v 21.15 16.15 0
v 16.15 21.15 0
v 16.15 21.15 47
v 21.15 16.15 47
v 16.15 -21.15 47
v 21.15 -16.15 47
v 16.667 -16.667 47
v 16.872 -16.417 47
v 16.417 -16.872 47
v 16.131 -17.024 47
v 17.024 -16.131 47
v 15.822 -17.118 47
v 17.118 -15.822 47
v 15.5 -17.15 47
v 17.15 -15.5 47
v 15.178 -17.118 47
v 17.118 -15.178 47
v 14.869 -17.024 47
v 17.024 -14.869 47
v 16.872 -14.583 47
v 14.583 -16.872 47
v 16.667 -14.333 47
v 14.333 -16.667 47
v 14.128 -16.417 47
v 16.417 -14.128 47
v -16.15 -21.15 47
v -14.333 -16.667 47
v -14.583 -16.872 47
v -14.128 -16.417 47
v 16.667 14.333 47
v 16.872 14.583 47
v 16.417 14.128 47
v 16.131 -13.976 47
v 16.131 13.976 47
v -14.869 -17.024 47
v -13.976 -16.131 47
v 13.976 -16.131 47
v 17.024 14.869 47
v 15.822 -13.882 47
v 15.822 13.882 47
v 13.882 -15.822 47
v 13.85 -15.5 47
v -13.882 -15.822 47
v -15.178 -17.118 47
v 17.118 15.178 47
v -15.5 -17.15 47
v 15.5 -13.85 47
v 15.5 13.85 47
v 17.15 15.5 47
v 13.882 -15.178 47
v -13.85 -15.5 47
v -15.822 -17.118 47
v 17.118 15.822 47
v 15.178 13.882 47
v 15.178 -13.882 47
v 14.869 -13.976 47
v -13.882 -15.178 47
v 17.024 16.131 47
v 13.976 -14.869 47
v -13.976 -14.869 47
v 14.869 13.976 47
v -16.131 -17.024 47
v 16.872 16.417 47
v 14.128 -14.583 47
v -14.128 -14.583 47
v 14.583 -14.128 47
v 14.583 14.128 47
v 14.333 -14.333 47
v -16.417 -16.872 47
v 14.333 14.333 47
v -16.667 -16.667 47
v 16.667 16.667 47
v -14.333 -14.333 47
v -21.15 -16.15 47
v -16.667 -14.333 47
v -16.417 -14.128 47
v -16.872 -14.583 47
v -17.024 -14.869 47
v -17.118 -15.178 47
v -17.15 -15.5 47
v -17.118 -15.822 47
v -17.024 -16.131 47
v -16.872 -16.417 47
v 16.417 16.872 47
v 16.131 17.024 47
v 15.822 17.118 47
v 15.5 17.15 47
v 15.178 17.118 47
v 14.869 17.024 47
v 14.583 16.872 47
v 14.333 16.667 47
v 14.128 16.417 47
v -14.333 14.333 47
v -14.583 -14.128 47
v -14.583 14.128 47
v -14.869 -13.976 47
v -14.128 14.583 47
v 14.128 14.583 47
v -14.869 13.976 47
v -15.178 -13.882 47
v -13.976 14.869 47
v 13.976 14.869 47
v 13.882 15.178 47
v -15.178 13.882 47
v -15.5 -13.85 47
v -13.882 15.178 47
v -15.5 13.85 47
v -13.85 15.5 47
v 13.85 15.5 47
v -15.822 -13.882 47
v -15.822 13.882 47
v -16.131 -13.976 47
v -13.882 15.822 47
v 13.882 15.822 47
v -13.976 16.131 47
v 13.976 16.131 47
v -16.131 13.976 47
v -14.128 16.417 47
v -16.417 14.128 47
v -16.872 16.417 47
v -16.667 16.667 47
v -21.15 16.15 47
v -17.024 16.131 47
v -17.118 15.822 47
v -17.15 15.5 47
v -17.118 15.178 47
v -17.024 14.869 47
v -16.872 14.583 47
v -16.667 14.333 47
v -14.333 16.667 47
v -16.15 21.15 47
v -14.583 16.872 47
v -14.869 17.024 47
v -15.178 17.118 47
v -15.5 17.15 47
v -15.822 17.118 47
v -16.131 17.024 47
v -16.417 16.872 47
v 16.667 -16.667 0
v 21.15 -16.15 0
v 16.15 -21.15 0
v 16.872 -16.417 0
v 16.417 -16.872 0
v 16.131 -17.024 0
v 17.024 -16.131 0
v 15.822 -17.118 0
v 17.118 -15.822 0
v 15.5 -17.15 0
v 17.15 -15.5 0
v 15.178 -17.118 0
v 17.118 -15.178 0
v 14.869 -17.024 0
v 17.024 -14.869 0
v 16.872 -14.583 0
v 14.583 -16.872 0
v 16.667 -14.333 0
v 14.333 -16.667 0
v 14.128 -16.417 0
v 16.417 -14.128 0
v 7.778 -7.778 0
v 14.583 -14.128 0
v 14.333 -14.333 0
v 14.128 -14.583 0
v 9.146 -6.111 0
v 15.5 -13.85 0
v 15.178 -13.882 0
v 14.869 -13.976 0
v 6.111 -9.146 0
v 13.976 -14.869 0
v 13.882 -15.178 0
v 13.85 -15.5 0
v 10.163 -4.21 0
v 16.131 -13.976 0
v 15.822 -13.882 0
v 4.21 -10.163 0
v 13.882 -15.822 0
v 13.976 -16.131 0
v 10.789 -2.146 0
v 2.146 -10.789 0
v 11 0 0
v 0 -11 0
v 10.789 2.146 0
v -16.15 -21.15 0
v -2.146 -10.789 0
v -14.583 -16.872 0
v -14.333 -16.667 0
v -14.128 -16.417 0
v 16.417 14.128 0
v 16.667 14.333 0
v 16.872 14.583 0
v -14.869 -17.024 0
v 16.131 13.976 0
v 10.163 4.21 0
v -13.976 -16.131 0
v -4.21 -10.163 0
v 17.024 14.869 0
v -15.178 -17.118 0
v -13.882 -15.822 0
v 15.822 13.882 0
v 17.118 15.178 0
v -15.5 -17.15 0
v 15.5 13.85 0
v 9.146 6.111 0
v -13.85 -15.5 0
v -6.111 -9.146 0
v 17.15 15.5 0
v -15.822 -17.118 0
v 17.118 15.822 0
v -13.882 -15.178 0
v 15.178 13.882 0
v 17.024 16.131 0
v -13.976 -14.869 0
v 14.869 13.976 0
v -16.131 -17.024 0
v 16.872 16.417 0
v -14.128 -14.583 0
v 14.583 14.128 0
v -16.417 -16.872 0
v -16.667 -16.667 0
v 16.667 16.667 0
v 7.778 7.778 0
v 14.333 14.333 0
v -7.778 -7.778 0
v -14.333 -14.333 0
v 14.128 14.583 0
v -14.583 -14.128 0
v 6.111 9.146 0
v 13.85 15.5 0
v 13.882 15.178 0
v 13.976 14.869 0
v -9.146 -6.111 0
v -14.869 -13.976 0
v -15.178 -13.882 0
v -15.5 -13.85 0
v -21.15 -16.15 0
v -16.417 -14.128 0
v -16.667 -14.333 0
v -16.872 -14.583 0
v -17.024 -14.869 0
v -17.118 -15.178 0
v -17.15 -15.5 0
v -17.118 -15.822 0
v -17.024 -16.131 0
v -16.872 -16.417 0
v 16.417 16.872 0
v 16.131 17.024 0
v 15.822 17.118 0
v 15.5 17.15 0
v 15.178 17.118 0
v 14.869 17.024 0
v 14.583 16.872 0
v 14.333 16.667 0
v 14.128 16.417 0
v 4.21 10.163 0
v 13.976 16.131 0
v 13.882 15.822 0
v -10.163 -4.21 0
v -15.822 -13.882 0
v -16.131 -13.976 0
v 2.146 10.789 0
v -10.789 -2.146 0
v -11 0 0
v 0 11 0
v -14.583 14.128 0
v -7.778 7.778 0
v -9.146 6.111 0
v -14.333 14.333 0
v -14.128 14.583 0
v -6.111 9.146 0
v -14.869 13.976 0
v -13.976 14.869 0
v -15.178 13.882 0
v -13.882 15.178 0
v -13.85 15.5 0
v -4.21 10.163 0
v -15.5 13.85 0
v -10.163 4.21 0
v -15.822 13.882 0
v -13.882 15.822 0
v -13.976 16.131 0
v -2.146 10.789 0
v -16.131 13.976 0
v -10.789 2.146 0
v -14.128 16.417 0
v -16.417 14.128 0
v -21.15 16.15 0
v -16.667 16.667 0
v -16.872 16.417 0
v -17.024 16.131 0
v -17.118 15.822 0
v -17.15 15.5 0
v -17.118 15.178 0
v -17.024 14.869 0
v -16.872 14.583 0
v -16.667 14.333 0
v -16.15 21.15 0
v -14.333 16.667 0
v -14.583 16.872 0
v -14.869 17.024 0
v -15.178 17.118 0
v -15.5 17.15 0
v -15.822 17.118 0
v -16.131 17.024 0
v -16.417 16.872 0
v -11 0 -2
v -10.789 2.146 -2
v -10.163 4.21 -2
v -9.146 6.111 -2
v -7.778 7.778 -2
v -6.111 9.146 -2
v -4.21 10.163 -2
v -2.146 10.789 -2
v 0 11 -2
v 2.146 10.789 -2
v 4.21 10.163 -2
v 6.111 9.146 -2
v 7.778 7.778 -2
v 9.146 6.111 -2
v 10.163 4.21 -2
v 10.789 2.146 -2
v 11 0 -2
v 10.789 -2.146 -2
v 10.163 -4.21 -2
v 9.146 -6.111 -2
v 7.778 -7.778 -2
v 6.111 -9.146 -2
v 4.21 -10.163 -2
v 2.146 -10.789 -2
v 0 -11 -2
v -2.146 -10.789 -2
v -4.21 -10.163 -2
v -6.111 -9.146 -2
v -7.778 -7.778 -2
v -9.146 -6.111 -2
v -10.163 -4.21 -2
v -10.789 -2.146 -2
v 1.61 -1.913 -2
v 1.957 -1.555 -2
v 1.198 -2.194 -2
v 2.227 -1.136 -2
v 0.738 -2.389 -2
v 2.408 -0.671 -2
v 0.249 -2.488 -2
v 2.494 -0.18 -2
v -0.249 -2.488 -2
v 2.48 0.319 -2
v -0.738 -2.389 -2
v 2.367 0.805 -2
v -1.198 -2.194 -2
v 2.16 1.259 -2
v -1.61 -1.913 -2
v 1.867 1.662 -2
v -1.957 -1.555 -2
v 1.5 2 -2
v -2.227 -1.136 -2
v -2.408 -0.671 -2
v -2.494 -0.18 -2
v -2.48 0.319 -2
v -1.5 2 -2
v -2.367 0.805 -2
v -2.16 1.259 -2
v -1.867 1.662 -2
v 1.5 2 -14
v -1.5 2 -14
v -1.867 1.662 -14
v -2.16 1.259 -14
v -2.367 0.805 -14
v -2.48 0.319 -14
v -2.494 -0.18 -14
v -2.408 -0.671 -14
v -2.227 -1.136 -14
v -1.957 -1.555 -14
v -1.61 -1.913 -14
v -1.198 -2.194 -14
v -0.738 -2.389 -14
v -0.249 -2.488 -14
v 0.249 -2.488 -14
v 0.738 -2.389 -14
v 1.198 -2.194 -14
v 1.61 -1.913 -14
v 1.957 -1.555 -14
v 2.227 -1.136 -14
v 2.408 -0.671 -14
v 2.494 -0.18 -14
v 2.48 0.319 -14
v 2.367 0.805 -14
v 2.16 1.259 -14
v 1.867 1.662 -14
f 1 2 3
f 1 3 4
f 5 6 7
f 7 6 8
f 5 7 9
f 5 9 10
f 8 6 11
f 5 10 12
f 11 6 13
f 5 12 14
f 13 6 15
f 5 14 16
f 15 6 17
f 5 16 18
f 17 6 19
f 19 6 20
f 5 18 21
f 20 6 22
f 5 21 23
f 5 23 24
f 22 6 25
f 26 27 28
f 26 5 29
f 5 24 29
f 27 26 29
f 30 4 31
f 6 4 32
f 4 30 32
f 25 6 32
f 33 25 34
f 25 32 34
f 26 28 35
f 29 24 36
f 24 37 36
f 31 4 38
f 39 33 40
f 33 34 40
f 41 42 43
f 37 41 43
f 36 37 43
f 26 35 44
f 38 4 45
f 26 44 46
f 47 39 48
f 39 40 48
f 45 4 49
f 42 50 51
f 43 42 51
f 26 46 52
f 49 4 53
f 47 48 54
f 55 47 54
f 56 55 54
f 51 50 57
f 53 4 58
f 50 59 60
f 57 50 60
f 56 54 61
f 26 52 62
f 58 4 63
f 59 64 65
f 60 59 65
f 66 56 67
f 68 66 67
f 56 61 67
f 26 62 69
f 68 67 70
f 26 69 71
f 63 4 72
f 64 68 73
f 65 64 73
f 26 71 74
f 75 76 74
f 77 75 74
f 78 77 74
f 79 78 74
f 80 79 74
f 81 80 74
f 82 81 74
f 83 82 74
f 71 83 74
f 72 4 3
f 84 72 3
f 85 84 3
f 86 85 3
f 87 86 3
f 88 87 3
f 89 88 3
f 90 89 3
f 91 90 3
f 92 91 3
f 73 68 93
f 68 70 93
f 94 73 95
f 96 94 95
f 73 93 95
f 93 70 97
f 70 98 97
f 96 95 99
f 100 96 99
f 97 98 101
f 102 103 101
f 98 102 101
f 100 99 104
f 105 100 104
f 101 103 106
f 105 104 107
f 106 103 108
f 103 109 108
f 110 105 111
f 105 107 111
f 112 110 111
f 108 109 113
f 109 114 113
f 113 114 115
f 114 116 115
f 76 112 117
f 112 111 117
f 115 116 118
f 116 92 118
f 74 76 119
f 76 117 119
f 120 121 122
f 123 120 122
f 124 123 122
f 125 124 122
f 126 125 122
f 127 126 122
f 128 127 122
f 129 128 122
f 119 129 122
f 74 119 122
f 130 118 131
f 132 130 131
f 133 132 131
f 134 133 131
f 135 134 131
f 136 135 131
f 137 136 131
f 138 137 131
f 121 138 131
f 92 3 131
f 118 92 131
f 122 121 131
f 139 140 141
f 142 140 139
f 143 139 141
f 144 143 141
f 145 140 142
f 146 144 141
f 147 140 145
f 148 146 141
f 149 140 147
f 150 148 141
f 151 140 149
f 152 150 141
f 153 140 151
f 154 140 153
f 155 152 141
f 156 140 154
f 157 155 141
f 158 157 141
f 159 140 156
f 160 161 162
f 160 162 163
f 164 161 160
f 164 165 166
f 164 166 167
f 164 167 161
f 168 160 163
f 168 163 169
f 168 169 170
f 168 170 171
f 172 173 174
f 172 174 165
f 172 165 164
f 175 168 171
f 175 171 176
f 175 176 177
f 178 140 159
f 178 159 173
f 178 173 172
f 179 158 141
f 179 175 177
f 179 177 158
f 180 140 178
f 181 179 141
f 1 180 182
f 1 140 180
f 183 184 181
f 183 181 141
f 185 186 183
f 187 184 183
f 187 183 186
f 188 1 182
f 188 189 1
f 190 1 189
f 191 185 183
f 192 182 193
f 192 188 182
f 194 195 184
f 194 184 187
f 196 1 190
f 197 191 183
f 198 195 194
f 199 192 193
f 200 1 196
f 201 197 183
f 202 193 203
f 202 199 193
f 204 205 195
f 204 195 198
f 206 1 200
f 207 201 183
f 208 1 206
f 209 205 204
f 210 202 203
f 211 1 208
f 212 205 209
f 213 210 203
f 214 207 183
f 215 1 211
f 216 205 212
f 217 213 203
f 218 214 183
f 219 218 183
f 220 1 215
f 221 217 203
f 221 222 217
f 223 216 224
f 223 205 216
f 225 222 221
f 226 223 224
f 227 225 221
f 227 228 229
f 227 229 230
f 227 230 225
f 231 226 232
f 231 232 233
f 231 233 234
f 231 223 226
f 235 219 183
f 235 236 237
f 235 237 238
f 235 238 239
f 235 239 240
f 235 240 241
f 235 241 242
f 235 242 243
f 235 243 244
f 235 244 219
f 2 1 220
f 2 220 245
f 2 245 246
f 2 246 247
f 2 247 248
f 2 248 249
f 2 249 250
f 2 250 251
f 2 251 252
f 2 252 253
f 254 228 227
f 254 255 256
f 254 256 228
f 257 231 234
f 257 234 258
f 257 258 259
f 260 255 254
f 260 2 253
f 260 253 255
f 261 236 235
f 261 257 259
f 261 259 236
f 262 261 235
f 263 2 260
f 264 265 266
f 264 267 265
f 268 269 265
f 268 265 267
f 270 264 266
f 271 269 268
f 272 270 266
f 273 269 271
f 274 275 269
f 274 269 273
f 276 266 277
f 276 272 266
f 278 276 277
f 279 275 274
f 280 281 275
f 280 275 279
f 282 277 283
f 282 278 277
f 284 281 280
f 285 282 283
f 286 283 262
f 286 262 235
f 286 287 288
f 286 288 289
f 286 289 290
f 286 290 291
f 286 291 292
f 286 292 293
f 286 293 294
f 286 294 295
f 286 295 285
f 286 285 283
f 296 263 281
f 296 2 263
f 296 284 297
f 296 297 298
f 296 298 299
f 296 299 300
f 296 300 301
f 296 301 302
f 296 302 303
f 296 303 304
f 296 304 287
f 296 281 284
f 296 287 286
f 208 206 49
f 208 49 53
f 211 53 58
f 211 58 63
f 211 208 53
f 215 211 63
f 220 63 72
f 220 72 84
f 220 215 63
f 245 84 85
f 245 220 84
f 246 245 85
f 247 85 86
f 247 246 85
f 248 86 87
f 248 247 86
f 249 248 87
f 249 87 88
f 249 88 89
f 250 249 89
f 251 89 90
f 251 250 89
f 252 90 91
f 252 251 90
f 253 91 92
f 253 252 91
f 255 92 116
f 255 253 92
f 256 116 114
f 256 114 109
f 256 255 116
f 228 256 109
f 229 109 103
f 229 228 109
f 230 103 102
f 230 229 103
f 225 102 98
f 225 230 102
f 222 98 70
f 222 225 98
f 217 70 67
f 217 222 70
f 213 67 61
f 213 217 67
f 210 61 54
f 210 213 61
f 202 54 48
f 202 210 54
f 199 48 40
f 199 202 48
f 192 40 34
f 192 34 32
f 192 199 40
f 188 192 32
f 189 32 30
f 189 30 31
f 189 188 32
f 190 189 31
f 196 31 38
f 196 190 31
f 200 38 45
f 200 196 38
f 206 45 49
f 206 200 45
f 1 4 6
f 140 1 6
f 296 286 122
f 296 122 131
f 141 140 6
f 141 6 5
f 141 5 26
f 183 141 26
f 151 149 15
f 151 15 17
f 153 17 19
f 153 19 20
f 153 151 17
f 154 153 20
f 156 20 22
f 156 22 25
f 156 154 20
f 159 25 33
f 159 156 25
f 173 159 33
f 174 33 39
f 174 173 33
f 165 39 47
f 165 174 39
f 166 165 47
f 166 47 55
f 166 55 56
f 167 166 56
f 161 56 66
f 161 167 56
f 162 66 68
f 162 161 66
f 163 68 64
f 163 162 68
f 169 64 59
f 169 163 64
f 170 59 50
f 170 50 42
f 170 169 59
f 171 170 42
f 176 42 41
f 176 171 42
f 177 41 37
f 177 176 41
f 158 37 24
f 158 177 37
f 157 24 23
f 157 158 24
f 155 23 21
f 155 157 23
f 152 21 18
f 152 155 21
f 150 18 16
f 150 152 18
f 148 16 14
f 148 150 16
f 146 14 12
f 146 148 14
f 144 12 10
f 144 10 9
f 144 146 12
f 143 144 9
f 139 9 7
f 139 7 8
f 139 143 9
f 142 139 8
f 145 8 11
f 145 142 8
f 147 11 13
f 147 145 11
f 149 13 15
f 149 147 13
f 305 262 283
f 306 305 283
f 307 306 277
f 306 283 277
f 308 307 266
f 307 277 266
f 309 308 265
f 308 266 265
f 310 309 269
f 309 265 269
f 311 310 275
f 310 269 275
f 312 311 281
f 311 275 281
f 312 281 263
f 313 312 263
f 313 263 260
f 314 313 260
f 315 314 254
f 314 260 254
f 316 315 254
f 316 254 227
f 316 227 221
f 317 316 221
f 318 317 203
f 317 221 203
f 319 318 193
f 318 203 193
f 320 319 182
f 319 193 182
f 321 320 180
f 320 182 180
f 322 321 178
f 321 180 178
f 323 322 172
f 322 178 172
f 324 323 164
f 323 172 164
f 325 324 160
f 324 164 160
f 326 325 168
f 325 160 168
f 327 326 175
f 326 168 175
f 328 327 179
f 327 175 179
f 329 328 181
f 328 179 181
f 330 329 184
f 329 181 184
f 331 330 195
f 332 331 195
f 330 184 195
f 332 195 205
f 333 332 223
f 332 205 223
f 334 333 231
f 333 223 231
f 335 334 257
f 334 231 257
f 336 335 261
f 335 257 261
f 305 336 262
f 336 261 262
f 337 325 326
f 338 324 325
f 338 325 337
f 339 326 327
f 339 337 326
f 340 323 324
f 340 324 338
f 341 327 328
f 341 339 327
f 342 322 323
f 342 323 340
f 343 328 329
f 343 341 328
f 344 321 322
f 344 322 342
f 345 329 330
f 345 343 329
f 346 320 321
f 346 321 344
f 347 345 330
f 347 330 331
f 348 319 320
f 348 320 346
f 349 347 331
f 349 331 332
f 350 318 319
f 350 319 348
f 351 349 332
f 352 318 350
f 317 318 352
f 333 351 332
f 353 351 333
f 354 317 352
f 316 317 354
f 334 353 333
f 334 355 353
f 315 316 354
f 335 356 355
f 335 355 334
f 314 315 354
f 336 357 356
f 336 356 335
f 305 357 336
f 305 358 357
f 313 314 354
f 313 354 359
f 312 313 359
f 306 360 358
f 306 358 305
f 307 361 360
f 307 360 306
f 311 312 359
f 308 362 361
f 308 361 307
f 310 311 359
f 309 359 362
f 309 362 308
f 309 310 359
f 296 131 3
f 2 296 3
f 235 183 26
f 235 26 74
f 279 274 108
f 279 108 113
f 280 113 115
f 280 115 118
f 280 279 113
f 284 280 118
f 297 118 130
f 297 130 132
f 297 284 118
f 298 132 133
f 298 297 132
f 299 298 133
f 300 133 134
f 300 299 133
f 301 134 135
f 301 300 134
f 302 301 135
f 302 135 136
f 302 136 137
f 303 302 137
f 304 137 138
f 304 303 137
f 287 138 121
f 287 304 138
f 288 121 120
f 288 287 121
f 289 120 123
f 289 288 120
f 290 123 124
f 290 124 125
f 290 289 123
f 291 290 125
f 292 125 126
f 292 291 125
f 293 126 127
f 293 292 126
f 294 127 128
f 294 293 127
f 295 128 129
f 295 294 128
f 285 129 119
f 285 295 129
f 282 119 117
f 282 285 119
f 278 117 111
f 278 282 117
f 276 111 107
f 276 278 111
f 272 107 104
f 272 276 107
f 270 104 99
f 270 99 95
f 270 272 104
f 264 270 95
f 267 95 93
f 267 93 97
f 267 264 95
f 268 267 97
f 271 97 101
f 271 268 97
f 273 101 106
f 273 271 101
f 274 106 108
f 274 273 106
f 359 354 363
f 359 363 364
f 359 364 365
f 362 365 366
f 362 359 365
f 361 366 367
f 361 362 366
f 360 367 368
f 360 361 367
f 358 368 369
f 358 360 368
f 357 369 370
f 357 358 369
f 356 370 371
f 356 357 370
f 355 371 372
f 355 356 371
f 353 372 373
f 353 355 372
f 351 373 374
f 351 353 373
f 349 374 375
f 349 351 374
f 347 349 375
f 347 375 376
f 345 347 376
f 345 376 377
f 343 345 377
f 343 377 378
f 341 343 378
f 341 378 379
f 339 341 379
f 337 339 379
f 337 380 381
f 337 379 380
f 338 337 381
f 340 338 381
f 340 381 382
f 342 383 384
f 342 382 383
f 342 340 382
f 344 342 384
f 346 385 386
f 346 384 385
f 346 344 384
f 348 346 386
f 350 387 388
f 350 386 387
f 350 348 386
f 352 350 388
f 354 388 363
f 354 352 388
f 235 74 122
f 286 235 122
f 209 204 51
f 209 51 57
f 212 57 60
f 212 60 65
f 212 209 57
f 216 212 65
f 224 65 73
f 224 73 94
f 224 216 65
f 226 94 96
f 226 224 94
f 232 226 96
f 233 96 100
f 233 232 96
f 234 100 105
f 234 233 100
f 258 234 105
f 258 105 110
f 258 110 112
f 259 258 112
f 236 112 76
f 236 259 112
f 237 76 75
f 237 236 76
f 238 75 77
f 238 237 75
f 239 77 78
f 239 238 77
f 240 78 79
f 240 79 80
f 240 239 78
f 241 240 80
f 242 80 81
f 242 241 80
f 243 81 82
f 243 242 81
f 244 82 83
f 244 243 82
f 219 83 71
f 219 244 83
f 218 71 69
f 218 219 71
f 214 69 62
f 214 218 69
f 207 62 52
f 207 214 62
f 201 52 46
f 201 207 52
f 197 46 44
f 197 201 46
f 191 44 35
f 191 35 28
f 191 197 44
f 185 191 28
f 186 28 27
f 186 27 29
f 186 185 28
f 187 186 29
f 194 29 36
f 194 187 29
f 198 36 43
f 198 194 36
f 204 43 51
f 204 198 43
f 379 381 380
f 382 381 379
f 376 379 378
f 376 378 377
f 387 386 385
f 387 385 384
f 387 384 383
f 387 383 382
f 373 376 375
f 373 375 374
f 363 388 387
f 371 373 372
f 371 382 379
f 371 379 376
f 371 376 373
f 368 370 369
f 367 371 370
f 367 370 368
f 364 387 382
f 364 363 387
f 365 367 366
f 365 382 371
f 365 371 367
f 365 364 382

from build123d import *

# Parameters (mm, degrees)
SKETCH_1_R          = 1.65
EXTRUDE_1_DEPTH     = 47
SKETCH_3_R          = 11
EXTRUDE_2_DEPTH     = 2
EXTRUDE_3_DEPTH     = 22
CUT_EXTRUDE_1_DEPTH = 10


with BuildPart() as part:
    # 草图1 → 凸台-拉伸1 (new body)
    with BuildSketch(Plane.XY):
        Polygon((-21.15, 16.15), (-16.15, 21.15), (16.15, 21.15), (21.15, 16.15), (21.15, -16.15), (16.15, -21.15), (-16.15, -21.15), (-21.15, -16.15), align=None)
        with Locations((15.5, 15.5)):
            Circle(SKETCH_1_R, mode=Mode.SUBTRACT)
        with Locations((-15.5, 15.5)):
            Circle(SKETCH_1_R, mode=Mode.SUBTRACT)
        with Locations((15.5, -15.5)):
            Circle(SKETCH_1_R, mode=Mode.SUBTRACT)
        with Locations((-15.5, -15.5)):
            Circle(SKETCH_1_R, mode=Mode.SUBTRACT)
    extrude(amount=EXTRUDE_1_DEPTH)

    # 草图3 → 凸台-拉伸2 (add)
    with BuildSketch(Plane(origin=(0, 0, 0), x_dir=(-1, 0, 0), z_dir=(0, 0, -1))):
        Circle(SKETCH_3_R)
    extrude(amount=EXTRUDE_2_DEPTH)

    # 草图4 → 凸台-拉伸3 (add)
    with BuildSketch(Plane(origin=(0, 0, -2), x_dir=(-1, 0, 0), z_dir=(0, 0, -1))):
        with BuildLine():
            Line((-1.5, 2), (1.5, 2))
            ThreePointArc((1.5, 2), (0, -2.5), (-1.5, 2))
        make_face()
    extrude(amount=EXTRUDE_3_DEPTH)

    # 草图5 → 切除-拉伸1 (cut)
    with BuildSketch(Plane(origin=(0, 0, -24), x_dir=(-1, 0, 0), z_dir=(0, 0, -1))):
        with BuildLine():
            Line((1.5, 2), (-1.5, 2))
            ThreePointArc((-1.5, 2), (0, -2.5), (1.5, 2))
        make_face()
    extrude(amount=-CUT_EXTRUDE_1_DEPTH, mode=Mode.SUBTRACT)


solid = part.part
